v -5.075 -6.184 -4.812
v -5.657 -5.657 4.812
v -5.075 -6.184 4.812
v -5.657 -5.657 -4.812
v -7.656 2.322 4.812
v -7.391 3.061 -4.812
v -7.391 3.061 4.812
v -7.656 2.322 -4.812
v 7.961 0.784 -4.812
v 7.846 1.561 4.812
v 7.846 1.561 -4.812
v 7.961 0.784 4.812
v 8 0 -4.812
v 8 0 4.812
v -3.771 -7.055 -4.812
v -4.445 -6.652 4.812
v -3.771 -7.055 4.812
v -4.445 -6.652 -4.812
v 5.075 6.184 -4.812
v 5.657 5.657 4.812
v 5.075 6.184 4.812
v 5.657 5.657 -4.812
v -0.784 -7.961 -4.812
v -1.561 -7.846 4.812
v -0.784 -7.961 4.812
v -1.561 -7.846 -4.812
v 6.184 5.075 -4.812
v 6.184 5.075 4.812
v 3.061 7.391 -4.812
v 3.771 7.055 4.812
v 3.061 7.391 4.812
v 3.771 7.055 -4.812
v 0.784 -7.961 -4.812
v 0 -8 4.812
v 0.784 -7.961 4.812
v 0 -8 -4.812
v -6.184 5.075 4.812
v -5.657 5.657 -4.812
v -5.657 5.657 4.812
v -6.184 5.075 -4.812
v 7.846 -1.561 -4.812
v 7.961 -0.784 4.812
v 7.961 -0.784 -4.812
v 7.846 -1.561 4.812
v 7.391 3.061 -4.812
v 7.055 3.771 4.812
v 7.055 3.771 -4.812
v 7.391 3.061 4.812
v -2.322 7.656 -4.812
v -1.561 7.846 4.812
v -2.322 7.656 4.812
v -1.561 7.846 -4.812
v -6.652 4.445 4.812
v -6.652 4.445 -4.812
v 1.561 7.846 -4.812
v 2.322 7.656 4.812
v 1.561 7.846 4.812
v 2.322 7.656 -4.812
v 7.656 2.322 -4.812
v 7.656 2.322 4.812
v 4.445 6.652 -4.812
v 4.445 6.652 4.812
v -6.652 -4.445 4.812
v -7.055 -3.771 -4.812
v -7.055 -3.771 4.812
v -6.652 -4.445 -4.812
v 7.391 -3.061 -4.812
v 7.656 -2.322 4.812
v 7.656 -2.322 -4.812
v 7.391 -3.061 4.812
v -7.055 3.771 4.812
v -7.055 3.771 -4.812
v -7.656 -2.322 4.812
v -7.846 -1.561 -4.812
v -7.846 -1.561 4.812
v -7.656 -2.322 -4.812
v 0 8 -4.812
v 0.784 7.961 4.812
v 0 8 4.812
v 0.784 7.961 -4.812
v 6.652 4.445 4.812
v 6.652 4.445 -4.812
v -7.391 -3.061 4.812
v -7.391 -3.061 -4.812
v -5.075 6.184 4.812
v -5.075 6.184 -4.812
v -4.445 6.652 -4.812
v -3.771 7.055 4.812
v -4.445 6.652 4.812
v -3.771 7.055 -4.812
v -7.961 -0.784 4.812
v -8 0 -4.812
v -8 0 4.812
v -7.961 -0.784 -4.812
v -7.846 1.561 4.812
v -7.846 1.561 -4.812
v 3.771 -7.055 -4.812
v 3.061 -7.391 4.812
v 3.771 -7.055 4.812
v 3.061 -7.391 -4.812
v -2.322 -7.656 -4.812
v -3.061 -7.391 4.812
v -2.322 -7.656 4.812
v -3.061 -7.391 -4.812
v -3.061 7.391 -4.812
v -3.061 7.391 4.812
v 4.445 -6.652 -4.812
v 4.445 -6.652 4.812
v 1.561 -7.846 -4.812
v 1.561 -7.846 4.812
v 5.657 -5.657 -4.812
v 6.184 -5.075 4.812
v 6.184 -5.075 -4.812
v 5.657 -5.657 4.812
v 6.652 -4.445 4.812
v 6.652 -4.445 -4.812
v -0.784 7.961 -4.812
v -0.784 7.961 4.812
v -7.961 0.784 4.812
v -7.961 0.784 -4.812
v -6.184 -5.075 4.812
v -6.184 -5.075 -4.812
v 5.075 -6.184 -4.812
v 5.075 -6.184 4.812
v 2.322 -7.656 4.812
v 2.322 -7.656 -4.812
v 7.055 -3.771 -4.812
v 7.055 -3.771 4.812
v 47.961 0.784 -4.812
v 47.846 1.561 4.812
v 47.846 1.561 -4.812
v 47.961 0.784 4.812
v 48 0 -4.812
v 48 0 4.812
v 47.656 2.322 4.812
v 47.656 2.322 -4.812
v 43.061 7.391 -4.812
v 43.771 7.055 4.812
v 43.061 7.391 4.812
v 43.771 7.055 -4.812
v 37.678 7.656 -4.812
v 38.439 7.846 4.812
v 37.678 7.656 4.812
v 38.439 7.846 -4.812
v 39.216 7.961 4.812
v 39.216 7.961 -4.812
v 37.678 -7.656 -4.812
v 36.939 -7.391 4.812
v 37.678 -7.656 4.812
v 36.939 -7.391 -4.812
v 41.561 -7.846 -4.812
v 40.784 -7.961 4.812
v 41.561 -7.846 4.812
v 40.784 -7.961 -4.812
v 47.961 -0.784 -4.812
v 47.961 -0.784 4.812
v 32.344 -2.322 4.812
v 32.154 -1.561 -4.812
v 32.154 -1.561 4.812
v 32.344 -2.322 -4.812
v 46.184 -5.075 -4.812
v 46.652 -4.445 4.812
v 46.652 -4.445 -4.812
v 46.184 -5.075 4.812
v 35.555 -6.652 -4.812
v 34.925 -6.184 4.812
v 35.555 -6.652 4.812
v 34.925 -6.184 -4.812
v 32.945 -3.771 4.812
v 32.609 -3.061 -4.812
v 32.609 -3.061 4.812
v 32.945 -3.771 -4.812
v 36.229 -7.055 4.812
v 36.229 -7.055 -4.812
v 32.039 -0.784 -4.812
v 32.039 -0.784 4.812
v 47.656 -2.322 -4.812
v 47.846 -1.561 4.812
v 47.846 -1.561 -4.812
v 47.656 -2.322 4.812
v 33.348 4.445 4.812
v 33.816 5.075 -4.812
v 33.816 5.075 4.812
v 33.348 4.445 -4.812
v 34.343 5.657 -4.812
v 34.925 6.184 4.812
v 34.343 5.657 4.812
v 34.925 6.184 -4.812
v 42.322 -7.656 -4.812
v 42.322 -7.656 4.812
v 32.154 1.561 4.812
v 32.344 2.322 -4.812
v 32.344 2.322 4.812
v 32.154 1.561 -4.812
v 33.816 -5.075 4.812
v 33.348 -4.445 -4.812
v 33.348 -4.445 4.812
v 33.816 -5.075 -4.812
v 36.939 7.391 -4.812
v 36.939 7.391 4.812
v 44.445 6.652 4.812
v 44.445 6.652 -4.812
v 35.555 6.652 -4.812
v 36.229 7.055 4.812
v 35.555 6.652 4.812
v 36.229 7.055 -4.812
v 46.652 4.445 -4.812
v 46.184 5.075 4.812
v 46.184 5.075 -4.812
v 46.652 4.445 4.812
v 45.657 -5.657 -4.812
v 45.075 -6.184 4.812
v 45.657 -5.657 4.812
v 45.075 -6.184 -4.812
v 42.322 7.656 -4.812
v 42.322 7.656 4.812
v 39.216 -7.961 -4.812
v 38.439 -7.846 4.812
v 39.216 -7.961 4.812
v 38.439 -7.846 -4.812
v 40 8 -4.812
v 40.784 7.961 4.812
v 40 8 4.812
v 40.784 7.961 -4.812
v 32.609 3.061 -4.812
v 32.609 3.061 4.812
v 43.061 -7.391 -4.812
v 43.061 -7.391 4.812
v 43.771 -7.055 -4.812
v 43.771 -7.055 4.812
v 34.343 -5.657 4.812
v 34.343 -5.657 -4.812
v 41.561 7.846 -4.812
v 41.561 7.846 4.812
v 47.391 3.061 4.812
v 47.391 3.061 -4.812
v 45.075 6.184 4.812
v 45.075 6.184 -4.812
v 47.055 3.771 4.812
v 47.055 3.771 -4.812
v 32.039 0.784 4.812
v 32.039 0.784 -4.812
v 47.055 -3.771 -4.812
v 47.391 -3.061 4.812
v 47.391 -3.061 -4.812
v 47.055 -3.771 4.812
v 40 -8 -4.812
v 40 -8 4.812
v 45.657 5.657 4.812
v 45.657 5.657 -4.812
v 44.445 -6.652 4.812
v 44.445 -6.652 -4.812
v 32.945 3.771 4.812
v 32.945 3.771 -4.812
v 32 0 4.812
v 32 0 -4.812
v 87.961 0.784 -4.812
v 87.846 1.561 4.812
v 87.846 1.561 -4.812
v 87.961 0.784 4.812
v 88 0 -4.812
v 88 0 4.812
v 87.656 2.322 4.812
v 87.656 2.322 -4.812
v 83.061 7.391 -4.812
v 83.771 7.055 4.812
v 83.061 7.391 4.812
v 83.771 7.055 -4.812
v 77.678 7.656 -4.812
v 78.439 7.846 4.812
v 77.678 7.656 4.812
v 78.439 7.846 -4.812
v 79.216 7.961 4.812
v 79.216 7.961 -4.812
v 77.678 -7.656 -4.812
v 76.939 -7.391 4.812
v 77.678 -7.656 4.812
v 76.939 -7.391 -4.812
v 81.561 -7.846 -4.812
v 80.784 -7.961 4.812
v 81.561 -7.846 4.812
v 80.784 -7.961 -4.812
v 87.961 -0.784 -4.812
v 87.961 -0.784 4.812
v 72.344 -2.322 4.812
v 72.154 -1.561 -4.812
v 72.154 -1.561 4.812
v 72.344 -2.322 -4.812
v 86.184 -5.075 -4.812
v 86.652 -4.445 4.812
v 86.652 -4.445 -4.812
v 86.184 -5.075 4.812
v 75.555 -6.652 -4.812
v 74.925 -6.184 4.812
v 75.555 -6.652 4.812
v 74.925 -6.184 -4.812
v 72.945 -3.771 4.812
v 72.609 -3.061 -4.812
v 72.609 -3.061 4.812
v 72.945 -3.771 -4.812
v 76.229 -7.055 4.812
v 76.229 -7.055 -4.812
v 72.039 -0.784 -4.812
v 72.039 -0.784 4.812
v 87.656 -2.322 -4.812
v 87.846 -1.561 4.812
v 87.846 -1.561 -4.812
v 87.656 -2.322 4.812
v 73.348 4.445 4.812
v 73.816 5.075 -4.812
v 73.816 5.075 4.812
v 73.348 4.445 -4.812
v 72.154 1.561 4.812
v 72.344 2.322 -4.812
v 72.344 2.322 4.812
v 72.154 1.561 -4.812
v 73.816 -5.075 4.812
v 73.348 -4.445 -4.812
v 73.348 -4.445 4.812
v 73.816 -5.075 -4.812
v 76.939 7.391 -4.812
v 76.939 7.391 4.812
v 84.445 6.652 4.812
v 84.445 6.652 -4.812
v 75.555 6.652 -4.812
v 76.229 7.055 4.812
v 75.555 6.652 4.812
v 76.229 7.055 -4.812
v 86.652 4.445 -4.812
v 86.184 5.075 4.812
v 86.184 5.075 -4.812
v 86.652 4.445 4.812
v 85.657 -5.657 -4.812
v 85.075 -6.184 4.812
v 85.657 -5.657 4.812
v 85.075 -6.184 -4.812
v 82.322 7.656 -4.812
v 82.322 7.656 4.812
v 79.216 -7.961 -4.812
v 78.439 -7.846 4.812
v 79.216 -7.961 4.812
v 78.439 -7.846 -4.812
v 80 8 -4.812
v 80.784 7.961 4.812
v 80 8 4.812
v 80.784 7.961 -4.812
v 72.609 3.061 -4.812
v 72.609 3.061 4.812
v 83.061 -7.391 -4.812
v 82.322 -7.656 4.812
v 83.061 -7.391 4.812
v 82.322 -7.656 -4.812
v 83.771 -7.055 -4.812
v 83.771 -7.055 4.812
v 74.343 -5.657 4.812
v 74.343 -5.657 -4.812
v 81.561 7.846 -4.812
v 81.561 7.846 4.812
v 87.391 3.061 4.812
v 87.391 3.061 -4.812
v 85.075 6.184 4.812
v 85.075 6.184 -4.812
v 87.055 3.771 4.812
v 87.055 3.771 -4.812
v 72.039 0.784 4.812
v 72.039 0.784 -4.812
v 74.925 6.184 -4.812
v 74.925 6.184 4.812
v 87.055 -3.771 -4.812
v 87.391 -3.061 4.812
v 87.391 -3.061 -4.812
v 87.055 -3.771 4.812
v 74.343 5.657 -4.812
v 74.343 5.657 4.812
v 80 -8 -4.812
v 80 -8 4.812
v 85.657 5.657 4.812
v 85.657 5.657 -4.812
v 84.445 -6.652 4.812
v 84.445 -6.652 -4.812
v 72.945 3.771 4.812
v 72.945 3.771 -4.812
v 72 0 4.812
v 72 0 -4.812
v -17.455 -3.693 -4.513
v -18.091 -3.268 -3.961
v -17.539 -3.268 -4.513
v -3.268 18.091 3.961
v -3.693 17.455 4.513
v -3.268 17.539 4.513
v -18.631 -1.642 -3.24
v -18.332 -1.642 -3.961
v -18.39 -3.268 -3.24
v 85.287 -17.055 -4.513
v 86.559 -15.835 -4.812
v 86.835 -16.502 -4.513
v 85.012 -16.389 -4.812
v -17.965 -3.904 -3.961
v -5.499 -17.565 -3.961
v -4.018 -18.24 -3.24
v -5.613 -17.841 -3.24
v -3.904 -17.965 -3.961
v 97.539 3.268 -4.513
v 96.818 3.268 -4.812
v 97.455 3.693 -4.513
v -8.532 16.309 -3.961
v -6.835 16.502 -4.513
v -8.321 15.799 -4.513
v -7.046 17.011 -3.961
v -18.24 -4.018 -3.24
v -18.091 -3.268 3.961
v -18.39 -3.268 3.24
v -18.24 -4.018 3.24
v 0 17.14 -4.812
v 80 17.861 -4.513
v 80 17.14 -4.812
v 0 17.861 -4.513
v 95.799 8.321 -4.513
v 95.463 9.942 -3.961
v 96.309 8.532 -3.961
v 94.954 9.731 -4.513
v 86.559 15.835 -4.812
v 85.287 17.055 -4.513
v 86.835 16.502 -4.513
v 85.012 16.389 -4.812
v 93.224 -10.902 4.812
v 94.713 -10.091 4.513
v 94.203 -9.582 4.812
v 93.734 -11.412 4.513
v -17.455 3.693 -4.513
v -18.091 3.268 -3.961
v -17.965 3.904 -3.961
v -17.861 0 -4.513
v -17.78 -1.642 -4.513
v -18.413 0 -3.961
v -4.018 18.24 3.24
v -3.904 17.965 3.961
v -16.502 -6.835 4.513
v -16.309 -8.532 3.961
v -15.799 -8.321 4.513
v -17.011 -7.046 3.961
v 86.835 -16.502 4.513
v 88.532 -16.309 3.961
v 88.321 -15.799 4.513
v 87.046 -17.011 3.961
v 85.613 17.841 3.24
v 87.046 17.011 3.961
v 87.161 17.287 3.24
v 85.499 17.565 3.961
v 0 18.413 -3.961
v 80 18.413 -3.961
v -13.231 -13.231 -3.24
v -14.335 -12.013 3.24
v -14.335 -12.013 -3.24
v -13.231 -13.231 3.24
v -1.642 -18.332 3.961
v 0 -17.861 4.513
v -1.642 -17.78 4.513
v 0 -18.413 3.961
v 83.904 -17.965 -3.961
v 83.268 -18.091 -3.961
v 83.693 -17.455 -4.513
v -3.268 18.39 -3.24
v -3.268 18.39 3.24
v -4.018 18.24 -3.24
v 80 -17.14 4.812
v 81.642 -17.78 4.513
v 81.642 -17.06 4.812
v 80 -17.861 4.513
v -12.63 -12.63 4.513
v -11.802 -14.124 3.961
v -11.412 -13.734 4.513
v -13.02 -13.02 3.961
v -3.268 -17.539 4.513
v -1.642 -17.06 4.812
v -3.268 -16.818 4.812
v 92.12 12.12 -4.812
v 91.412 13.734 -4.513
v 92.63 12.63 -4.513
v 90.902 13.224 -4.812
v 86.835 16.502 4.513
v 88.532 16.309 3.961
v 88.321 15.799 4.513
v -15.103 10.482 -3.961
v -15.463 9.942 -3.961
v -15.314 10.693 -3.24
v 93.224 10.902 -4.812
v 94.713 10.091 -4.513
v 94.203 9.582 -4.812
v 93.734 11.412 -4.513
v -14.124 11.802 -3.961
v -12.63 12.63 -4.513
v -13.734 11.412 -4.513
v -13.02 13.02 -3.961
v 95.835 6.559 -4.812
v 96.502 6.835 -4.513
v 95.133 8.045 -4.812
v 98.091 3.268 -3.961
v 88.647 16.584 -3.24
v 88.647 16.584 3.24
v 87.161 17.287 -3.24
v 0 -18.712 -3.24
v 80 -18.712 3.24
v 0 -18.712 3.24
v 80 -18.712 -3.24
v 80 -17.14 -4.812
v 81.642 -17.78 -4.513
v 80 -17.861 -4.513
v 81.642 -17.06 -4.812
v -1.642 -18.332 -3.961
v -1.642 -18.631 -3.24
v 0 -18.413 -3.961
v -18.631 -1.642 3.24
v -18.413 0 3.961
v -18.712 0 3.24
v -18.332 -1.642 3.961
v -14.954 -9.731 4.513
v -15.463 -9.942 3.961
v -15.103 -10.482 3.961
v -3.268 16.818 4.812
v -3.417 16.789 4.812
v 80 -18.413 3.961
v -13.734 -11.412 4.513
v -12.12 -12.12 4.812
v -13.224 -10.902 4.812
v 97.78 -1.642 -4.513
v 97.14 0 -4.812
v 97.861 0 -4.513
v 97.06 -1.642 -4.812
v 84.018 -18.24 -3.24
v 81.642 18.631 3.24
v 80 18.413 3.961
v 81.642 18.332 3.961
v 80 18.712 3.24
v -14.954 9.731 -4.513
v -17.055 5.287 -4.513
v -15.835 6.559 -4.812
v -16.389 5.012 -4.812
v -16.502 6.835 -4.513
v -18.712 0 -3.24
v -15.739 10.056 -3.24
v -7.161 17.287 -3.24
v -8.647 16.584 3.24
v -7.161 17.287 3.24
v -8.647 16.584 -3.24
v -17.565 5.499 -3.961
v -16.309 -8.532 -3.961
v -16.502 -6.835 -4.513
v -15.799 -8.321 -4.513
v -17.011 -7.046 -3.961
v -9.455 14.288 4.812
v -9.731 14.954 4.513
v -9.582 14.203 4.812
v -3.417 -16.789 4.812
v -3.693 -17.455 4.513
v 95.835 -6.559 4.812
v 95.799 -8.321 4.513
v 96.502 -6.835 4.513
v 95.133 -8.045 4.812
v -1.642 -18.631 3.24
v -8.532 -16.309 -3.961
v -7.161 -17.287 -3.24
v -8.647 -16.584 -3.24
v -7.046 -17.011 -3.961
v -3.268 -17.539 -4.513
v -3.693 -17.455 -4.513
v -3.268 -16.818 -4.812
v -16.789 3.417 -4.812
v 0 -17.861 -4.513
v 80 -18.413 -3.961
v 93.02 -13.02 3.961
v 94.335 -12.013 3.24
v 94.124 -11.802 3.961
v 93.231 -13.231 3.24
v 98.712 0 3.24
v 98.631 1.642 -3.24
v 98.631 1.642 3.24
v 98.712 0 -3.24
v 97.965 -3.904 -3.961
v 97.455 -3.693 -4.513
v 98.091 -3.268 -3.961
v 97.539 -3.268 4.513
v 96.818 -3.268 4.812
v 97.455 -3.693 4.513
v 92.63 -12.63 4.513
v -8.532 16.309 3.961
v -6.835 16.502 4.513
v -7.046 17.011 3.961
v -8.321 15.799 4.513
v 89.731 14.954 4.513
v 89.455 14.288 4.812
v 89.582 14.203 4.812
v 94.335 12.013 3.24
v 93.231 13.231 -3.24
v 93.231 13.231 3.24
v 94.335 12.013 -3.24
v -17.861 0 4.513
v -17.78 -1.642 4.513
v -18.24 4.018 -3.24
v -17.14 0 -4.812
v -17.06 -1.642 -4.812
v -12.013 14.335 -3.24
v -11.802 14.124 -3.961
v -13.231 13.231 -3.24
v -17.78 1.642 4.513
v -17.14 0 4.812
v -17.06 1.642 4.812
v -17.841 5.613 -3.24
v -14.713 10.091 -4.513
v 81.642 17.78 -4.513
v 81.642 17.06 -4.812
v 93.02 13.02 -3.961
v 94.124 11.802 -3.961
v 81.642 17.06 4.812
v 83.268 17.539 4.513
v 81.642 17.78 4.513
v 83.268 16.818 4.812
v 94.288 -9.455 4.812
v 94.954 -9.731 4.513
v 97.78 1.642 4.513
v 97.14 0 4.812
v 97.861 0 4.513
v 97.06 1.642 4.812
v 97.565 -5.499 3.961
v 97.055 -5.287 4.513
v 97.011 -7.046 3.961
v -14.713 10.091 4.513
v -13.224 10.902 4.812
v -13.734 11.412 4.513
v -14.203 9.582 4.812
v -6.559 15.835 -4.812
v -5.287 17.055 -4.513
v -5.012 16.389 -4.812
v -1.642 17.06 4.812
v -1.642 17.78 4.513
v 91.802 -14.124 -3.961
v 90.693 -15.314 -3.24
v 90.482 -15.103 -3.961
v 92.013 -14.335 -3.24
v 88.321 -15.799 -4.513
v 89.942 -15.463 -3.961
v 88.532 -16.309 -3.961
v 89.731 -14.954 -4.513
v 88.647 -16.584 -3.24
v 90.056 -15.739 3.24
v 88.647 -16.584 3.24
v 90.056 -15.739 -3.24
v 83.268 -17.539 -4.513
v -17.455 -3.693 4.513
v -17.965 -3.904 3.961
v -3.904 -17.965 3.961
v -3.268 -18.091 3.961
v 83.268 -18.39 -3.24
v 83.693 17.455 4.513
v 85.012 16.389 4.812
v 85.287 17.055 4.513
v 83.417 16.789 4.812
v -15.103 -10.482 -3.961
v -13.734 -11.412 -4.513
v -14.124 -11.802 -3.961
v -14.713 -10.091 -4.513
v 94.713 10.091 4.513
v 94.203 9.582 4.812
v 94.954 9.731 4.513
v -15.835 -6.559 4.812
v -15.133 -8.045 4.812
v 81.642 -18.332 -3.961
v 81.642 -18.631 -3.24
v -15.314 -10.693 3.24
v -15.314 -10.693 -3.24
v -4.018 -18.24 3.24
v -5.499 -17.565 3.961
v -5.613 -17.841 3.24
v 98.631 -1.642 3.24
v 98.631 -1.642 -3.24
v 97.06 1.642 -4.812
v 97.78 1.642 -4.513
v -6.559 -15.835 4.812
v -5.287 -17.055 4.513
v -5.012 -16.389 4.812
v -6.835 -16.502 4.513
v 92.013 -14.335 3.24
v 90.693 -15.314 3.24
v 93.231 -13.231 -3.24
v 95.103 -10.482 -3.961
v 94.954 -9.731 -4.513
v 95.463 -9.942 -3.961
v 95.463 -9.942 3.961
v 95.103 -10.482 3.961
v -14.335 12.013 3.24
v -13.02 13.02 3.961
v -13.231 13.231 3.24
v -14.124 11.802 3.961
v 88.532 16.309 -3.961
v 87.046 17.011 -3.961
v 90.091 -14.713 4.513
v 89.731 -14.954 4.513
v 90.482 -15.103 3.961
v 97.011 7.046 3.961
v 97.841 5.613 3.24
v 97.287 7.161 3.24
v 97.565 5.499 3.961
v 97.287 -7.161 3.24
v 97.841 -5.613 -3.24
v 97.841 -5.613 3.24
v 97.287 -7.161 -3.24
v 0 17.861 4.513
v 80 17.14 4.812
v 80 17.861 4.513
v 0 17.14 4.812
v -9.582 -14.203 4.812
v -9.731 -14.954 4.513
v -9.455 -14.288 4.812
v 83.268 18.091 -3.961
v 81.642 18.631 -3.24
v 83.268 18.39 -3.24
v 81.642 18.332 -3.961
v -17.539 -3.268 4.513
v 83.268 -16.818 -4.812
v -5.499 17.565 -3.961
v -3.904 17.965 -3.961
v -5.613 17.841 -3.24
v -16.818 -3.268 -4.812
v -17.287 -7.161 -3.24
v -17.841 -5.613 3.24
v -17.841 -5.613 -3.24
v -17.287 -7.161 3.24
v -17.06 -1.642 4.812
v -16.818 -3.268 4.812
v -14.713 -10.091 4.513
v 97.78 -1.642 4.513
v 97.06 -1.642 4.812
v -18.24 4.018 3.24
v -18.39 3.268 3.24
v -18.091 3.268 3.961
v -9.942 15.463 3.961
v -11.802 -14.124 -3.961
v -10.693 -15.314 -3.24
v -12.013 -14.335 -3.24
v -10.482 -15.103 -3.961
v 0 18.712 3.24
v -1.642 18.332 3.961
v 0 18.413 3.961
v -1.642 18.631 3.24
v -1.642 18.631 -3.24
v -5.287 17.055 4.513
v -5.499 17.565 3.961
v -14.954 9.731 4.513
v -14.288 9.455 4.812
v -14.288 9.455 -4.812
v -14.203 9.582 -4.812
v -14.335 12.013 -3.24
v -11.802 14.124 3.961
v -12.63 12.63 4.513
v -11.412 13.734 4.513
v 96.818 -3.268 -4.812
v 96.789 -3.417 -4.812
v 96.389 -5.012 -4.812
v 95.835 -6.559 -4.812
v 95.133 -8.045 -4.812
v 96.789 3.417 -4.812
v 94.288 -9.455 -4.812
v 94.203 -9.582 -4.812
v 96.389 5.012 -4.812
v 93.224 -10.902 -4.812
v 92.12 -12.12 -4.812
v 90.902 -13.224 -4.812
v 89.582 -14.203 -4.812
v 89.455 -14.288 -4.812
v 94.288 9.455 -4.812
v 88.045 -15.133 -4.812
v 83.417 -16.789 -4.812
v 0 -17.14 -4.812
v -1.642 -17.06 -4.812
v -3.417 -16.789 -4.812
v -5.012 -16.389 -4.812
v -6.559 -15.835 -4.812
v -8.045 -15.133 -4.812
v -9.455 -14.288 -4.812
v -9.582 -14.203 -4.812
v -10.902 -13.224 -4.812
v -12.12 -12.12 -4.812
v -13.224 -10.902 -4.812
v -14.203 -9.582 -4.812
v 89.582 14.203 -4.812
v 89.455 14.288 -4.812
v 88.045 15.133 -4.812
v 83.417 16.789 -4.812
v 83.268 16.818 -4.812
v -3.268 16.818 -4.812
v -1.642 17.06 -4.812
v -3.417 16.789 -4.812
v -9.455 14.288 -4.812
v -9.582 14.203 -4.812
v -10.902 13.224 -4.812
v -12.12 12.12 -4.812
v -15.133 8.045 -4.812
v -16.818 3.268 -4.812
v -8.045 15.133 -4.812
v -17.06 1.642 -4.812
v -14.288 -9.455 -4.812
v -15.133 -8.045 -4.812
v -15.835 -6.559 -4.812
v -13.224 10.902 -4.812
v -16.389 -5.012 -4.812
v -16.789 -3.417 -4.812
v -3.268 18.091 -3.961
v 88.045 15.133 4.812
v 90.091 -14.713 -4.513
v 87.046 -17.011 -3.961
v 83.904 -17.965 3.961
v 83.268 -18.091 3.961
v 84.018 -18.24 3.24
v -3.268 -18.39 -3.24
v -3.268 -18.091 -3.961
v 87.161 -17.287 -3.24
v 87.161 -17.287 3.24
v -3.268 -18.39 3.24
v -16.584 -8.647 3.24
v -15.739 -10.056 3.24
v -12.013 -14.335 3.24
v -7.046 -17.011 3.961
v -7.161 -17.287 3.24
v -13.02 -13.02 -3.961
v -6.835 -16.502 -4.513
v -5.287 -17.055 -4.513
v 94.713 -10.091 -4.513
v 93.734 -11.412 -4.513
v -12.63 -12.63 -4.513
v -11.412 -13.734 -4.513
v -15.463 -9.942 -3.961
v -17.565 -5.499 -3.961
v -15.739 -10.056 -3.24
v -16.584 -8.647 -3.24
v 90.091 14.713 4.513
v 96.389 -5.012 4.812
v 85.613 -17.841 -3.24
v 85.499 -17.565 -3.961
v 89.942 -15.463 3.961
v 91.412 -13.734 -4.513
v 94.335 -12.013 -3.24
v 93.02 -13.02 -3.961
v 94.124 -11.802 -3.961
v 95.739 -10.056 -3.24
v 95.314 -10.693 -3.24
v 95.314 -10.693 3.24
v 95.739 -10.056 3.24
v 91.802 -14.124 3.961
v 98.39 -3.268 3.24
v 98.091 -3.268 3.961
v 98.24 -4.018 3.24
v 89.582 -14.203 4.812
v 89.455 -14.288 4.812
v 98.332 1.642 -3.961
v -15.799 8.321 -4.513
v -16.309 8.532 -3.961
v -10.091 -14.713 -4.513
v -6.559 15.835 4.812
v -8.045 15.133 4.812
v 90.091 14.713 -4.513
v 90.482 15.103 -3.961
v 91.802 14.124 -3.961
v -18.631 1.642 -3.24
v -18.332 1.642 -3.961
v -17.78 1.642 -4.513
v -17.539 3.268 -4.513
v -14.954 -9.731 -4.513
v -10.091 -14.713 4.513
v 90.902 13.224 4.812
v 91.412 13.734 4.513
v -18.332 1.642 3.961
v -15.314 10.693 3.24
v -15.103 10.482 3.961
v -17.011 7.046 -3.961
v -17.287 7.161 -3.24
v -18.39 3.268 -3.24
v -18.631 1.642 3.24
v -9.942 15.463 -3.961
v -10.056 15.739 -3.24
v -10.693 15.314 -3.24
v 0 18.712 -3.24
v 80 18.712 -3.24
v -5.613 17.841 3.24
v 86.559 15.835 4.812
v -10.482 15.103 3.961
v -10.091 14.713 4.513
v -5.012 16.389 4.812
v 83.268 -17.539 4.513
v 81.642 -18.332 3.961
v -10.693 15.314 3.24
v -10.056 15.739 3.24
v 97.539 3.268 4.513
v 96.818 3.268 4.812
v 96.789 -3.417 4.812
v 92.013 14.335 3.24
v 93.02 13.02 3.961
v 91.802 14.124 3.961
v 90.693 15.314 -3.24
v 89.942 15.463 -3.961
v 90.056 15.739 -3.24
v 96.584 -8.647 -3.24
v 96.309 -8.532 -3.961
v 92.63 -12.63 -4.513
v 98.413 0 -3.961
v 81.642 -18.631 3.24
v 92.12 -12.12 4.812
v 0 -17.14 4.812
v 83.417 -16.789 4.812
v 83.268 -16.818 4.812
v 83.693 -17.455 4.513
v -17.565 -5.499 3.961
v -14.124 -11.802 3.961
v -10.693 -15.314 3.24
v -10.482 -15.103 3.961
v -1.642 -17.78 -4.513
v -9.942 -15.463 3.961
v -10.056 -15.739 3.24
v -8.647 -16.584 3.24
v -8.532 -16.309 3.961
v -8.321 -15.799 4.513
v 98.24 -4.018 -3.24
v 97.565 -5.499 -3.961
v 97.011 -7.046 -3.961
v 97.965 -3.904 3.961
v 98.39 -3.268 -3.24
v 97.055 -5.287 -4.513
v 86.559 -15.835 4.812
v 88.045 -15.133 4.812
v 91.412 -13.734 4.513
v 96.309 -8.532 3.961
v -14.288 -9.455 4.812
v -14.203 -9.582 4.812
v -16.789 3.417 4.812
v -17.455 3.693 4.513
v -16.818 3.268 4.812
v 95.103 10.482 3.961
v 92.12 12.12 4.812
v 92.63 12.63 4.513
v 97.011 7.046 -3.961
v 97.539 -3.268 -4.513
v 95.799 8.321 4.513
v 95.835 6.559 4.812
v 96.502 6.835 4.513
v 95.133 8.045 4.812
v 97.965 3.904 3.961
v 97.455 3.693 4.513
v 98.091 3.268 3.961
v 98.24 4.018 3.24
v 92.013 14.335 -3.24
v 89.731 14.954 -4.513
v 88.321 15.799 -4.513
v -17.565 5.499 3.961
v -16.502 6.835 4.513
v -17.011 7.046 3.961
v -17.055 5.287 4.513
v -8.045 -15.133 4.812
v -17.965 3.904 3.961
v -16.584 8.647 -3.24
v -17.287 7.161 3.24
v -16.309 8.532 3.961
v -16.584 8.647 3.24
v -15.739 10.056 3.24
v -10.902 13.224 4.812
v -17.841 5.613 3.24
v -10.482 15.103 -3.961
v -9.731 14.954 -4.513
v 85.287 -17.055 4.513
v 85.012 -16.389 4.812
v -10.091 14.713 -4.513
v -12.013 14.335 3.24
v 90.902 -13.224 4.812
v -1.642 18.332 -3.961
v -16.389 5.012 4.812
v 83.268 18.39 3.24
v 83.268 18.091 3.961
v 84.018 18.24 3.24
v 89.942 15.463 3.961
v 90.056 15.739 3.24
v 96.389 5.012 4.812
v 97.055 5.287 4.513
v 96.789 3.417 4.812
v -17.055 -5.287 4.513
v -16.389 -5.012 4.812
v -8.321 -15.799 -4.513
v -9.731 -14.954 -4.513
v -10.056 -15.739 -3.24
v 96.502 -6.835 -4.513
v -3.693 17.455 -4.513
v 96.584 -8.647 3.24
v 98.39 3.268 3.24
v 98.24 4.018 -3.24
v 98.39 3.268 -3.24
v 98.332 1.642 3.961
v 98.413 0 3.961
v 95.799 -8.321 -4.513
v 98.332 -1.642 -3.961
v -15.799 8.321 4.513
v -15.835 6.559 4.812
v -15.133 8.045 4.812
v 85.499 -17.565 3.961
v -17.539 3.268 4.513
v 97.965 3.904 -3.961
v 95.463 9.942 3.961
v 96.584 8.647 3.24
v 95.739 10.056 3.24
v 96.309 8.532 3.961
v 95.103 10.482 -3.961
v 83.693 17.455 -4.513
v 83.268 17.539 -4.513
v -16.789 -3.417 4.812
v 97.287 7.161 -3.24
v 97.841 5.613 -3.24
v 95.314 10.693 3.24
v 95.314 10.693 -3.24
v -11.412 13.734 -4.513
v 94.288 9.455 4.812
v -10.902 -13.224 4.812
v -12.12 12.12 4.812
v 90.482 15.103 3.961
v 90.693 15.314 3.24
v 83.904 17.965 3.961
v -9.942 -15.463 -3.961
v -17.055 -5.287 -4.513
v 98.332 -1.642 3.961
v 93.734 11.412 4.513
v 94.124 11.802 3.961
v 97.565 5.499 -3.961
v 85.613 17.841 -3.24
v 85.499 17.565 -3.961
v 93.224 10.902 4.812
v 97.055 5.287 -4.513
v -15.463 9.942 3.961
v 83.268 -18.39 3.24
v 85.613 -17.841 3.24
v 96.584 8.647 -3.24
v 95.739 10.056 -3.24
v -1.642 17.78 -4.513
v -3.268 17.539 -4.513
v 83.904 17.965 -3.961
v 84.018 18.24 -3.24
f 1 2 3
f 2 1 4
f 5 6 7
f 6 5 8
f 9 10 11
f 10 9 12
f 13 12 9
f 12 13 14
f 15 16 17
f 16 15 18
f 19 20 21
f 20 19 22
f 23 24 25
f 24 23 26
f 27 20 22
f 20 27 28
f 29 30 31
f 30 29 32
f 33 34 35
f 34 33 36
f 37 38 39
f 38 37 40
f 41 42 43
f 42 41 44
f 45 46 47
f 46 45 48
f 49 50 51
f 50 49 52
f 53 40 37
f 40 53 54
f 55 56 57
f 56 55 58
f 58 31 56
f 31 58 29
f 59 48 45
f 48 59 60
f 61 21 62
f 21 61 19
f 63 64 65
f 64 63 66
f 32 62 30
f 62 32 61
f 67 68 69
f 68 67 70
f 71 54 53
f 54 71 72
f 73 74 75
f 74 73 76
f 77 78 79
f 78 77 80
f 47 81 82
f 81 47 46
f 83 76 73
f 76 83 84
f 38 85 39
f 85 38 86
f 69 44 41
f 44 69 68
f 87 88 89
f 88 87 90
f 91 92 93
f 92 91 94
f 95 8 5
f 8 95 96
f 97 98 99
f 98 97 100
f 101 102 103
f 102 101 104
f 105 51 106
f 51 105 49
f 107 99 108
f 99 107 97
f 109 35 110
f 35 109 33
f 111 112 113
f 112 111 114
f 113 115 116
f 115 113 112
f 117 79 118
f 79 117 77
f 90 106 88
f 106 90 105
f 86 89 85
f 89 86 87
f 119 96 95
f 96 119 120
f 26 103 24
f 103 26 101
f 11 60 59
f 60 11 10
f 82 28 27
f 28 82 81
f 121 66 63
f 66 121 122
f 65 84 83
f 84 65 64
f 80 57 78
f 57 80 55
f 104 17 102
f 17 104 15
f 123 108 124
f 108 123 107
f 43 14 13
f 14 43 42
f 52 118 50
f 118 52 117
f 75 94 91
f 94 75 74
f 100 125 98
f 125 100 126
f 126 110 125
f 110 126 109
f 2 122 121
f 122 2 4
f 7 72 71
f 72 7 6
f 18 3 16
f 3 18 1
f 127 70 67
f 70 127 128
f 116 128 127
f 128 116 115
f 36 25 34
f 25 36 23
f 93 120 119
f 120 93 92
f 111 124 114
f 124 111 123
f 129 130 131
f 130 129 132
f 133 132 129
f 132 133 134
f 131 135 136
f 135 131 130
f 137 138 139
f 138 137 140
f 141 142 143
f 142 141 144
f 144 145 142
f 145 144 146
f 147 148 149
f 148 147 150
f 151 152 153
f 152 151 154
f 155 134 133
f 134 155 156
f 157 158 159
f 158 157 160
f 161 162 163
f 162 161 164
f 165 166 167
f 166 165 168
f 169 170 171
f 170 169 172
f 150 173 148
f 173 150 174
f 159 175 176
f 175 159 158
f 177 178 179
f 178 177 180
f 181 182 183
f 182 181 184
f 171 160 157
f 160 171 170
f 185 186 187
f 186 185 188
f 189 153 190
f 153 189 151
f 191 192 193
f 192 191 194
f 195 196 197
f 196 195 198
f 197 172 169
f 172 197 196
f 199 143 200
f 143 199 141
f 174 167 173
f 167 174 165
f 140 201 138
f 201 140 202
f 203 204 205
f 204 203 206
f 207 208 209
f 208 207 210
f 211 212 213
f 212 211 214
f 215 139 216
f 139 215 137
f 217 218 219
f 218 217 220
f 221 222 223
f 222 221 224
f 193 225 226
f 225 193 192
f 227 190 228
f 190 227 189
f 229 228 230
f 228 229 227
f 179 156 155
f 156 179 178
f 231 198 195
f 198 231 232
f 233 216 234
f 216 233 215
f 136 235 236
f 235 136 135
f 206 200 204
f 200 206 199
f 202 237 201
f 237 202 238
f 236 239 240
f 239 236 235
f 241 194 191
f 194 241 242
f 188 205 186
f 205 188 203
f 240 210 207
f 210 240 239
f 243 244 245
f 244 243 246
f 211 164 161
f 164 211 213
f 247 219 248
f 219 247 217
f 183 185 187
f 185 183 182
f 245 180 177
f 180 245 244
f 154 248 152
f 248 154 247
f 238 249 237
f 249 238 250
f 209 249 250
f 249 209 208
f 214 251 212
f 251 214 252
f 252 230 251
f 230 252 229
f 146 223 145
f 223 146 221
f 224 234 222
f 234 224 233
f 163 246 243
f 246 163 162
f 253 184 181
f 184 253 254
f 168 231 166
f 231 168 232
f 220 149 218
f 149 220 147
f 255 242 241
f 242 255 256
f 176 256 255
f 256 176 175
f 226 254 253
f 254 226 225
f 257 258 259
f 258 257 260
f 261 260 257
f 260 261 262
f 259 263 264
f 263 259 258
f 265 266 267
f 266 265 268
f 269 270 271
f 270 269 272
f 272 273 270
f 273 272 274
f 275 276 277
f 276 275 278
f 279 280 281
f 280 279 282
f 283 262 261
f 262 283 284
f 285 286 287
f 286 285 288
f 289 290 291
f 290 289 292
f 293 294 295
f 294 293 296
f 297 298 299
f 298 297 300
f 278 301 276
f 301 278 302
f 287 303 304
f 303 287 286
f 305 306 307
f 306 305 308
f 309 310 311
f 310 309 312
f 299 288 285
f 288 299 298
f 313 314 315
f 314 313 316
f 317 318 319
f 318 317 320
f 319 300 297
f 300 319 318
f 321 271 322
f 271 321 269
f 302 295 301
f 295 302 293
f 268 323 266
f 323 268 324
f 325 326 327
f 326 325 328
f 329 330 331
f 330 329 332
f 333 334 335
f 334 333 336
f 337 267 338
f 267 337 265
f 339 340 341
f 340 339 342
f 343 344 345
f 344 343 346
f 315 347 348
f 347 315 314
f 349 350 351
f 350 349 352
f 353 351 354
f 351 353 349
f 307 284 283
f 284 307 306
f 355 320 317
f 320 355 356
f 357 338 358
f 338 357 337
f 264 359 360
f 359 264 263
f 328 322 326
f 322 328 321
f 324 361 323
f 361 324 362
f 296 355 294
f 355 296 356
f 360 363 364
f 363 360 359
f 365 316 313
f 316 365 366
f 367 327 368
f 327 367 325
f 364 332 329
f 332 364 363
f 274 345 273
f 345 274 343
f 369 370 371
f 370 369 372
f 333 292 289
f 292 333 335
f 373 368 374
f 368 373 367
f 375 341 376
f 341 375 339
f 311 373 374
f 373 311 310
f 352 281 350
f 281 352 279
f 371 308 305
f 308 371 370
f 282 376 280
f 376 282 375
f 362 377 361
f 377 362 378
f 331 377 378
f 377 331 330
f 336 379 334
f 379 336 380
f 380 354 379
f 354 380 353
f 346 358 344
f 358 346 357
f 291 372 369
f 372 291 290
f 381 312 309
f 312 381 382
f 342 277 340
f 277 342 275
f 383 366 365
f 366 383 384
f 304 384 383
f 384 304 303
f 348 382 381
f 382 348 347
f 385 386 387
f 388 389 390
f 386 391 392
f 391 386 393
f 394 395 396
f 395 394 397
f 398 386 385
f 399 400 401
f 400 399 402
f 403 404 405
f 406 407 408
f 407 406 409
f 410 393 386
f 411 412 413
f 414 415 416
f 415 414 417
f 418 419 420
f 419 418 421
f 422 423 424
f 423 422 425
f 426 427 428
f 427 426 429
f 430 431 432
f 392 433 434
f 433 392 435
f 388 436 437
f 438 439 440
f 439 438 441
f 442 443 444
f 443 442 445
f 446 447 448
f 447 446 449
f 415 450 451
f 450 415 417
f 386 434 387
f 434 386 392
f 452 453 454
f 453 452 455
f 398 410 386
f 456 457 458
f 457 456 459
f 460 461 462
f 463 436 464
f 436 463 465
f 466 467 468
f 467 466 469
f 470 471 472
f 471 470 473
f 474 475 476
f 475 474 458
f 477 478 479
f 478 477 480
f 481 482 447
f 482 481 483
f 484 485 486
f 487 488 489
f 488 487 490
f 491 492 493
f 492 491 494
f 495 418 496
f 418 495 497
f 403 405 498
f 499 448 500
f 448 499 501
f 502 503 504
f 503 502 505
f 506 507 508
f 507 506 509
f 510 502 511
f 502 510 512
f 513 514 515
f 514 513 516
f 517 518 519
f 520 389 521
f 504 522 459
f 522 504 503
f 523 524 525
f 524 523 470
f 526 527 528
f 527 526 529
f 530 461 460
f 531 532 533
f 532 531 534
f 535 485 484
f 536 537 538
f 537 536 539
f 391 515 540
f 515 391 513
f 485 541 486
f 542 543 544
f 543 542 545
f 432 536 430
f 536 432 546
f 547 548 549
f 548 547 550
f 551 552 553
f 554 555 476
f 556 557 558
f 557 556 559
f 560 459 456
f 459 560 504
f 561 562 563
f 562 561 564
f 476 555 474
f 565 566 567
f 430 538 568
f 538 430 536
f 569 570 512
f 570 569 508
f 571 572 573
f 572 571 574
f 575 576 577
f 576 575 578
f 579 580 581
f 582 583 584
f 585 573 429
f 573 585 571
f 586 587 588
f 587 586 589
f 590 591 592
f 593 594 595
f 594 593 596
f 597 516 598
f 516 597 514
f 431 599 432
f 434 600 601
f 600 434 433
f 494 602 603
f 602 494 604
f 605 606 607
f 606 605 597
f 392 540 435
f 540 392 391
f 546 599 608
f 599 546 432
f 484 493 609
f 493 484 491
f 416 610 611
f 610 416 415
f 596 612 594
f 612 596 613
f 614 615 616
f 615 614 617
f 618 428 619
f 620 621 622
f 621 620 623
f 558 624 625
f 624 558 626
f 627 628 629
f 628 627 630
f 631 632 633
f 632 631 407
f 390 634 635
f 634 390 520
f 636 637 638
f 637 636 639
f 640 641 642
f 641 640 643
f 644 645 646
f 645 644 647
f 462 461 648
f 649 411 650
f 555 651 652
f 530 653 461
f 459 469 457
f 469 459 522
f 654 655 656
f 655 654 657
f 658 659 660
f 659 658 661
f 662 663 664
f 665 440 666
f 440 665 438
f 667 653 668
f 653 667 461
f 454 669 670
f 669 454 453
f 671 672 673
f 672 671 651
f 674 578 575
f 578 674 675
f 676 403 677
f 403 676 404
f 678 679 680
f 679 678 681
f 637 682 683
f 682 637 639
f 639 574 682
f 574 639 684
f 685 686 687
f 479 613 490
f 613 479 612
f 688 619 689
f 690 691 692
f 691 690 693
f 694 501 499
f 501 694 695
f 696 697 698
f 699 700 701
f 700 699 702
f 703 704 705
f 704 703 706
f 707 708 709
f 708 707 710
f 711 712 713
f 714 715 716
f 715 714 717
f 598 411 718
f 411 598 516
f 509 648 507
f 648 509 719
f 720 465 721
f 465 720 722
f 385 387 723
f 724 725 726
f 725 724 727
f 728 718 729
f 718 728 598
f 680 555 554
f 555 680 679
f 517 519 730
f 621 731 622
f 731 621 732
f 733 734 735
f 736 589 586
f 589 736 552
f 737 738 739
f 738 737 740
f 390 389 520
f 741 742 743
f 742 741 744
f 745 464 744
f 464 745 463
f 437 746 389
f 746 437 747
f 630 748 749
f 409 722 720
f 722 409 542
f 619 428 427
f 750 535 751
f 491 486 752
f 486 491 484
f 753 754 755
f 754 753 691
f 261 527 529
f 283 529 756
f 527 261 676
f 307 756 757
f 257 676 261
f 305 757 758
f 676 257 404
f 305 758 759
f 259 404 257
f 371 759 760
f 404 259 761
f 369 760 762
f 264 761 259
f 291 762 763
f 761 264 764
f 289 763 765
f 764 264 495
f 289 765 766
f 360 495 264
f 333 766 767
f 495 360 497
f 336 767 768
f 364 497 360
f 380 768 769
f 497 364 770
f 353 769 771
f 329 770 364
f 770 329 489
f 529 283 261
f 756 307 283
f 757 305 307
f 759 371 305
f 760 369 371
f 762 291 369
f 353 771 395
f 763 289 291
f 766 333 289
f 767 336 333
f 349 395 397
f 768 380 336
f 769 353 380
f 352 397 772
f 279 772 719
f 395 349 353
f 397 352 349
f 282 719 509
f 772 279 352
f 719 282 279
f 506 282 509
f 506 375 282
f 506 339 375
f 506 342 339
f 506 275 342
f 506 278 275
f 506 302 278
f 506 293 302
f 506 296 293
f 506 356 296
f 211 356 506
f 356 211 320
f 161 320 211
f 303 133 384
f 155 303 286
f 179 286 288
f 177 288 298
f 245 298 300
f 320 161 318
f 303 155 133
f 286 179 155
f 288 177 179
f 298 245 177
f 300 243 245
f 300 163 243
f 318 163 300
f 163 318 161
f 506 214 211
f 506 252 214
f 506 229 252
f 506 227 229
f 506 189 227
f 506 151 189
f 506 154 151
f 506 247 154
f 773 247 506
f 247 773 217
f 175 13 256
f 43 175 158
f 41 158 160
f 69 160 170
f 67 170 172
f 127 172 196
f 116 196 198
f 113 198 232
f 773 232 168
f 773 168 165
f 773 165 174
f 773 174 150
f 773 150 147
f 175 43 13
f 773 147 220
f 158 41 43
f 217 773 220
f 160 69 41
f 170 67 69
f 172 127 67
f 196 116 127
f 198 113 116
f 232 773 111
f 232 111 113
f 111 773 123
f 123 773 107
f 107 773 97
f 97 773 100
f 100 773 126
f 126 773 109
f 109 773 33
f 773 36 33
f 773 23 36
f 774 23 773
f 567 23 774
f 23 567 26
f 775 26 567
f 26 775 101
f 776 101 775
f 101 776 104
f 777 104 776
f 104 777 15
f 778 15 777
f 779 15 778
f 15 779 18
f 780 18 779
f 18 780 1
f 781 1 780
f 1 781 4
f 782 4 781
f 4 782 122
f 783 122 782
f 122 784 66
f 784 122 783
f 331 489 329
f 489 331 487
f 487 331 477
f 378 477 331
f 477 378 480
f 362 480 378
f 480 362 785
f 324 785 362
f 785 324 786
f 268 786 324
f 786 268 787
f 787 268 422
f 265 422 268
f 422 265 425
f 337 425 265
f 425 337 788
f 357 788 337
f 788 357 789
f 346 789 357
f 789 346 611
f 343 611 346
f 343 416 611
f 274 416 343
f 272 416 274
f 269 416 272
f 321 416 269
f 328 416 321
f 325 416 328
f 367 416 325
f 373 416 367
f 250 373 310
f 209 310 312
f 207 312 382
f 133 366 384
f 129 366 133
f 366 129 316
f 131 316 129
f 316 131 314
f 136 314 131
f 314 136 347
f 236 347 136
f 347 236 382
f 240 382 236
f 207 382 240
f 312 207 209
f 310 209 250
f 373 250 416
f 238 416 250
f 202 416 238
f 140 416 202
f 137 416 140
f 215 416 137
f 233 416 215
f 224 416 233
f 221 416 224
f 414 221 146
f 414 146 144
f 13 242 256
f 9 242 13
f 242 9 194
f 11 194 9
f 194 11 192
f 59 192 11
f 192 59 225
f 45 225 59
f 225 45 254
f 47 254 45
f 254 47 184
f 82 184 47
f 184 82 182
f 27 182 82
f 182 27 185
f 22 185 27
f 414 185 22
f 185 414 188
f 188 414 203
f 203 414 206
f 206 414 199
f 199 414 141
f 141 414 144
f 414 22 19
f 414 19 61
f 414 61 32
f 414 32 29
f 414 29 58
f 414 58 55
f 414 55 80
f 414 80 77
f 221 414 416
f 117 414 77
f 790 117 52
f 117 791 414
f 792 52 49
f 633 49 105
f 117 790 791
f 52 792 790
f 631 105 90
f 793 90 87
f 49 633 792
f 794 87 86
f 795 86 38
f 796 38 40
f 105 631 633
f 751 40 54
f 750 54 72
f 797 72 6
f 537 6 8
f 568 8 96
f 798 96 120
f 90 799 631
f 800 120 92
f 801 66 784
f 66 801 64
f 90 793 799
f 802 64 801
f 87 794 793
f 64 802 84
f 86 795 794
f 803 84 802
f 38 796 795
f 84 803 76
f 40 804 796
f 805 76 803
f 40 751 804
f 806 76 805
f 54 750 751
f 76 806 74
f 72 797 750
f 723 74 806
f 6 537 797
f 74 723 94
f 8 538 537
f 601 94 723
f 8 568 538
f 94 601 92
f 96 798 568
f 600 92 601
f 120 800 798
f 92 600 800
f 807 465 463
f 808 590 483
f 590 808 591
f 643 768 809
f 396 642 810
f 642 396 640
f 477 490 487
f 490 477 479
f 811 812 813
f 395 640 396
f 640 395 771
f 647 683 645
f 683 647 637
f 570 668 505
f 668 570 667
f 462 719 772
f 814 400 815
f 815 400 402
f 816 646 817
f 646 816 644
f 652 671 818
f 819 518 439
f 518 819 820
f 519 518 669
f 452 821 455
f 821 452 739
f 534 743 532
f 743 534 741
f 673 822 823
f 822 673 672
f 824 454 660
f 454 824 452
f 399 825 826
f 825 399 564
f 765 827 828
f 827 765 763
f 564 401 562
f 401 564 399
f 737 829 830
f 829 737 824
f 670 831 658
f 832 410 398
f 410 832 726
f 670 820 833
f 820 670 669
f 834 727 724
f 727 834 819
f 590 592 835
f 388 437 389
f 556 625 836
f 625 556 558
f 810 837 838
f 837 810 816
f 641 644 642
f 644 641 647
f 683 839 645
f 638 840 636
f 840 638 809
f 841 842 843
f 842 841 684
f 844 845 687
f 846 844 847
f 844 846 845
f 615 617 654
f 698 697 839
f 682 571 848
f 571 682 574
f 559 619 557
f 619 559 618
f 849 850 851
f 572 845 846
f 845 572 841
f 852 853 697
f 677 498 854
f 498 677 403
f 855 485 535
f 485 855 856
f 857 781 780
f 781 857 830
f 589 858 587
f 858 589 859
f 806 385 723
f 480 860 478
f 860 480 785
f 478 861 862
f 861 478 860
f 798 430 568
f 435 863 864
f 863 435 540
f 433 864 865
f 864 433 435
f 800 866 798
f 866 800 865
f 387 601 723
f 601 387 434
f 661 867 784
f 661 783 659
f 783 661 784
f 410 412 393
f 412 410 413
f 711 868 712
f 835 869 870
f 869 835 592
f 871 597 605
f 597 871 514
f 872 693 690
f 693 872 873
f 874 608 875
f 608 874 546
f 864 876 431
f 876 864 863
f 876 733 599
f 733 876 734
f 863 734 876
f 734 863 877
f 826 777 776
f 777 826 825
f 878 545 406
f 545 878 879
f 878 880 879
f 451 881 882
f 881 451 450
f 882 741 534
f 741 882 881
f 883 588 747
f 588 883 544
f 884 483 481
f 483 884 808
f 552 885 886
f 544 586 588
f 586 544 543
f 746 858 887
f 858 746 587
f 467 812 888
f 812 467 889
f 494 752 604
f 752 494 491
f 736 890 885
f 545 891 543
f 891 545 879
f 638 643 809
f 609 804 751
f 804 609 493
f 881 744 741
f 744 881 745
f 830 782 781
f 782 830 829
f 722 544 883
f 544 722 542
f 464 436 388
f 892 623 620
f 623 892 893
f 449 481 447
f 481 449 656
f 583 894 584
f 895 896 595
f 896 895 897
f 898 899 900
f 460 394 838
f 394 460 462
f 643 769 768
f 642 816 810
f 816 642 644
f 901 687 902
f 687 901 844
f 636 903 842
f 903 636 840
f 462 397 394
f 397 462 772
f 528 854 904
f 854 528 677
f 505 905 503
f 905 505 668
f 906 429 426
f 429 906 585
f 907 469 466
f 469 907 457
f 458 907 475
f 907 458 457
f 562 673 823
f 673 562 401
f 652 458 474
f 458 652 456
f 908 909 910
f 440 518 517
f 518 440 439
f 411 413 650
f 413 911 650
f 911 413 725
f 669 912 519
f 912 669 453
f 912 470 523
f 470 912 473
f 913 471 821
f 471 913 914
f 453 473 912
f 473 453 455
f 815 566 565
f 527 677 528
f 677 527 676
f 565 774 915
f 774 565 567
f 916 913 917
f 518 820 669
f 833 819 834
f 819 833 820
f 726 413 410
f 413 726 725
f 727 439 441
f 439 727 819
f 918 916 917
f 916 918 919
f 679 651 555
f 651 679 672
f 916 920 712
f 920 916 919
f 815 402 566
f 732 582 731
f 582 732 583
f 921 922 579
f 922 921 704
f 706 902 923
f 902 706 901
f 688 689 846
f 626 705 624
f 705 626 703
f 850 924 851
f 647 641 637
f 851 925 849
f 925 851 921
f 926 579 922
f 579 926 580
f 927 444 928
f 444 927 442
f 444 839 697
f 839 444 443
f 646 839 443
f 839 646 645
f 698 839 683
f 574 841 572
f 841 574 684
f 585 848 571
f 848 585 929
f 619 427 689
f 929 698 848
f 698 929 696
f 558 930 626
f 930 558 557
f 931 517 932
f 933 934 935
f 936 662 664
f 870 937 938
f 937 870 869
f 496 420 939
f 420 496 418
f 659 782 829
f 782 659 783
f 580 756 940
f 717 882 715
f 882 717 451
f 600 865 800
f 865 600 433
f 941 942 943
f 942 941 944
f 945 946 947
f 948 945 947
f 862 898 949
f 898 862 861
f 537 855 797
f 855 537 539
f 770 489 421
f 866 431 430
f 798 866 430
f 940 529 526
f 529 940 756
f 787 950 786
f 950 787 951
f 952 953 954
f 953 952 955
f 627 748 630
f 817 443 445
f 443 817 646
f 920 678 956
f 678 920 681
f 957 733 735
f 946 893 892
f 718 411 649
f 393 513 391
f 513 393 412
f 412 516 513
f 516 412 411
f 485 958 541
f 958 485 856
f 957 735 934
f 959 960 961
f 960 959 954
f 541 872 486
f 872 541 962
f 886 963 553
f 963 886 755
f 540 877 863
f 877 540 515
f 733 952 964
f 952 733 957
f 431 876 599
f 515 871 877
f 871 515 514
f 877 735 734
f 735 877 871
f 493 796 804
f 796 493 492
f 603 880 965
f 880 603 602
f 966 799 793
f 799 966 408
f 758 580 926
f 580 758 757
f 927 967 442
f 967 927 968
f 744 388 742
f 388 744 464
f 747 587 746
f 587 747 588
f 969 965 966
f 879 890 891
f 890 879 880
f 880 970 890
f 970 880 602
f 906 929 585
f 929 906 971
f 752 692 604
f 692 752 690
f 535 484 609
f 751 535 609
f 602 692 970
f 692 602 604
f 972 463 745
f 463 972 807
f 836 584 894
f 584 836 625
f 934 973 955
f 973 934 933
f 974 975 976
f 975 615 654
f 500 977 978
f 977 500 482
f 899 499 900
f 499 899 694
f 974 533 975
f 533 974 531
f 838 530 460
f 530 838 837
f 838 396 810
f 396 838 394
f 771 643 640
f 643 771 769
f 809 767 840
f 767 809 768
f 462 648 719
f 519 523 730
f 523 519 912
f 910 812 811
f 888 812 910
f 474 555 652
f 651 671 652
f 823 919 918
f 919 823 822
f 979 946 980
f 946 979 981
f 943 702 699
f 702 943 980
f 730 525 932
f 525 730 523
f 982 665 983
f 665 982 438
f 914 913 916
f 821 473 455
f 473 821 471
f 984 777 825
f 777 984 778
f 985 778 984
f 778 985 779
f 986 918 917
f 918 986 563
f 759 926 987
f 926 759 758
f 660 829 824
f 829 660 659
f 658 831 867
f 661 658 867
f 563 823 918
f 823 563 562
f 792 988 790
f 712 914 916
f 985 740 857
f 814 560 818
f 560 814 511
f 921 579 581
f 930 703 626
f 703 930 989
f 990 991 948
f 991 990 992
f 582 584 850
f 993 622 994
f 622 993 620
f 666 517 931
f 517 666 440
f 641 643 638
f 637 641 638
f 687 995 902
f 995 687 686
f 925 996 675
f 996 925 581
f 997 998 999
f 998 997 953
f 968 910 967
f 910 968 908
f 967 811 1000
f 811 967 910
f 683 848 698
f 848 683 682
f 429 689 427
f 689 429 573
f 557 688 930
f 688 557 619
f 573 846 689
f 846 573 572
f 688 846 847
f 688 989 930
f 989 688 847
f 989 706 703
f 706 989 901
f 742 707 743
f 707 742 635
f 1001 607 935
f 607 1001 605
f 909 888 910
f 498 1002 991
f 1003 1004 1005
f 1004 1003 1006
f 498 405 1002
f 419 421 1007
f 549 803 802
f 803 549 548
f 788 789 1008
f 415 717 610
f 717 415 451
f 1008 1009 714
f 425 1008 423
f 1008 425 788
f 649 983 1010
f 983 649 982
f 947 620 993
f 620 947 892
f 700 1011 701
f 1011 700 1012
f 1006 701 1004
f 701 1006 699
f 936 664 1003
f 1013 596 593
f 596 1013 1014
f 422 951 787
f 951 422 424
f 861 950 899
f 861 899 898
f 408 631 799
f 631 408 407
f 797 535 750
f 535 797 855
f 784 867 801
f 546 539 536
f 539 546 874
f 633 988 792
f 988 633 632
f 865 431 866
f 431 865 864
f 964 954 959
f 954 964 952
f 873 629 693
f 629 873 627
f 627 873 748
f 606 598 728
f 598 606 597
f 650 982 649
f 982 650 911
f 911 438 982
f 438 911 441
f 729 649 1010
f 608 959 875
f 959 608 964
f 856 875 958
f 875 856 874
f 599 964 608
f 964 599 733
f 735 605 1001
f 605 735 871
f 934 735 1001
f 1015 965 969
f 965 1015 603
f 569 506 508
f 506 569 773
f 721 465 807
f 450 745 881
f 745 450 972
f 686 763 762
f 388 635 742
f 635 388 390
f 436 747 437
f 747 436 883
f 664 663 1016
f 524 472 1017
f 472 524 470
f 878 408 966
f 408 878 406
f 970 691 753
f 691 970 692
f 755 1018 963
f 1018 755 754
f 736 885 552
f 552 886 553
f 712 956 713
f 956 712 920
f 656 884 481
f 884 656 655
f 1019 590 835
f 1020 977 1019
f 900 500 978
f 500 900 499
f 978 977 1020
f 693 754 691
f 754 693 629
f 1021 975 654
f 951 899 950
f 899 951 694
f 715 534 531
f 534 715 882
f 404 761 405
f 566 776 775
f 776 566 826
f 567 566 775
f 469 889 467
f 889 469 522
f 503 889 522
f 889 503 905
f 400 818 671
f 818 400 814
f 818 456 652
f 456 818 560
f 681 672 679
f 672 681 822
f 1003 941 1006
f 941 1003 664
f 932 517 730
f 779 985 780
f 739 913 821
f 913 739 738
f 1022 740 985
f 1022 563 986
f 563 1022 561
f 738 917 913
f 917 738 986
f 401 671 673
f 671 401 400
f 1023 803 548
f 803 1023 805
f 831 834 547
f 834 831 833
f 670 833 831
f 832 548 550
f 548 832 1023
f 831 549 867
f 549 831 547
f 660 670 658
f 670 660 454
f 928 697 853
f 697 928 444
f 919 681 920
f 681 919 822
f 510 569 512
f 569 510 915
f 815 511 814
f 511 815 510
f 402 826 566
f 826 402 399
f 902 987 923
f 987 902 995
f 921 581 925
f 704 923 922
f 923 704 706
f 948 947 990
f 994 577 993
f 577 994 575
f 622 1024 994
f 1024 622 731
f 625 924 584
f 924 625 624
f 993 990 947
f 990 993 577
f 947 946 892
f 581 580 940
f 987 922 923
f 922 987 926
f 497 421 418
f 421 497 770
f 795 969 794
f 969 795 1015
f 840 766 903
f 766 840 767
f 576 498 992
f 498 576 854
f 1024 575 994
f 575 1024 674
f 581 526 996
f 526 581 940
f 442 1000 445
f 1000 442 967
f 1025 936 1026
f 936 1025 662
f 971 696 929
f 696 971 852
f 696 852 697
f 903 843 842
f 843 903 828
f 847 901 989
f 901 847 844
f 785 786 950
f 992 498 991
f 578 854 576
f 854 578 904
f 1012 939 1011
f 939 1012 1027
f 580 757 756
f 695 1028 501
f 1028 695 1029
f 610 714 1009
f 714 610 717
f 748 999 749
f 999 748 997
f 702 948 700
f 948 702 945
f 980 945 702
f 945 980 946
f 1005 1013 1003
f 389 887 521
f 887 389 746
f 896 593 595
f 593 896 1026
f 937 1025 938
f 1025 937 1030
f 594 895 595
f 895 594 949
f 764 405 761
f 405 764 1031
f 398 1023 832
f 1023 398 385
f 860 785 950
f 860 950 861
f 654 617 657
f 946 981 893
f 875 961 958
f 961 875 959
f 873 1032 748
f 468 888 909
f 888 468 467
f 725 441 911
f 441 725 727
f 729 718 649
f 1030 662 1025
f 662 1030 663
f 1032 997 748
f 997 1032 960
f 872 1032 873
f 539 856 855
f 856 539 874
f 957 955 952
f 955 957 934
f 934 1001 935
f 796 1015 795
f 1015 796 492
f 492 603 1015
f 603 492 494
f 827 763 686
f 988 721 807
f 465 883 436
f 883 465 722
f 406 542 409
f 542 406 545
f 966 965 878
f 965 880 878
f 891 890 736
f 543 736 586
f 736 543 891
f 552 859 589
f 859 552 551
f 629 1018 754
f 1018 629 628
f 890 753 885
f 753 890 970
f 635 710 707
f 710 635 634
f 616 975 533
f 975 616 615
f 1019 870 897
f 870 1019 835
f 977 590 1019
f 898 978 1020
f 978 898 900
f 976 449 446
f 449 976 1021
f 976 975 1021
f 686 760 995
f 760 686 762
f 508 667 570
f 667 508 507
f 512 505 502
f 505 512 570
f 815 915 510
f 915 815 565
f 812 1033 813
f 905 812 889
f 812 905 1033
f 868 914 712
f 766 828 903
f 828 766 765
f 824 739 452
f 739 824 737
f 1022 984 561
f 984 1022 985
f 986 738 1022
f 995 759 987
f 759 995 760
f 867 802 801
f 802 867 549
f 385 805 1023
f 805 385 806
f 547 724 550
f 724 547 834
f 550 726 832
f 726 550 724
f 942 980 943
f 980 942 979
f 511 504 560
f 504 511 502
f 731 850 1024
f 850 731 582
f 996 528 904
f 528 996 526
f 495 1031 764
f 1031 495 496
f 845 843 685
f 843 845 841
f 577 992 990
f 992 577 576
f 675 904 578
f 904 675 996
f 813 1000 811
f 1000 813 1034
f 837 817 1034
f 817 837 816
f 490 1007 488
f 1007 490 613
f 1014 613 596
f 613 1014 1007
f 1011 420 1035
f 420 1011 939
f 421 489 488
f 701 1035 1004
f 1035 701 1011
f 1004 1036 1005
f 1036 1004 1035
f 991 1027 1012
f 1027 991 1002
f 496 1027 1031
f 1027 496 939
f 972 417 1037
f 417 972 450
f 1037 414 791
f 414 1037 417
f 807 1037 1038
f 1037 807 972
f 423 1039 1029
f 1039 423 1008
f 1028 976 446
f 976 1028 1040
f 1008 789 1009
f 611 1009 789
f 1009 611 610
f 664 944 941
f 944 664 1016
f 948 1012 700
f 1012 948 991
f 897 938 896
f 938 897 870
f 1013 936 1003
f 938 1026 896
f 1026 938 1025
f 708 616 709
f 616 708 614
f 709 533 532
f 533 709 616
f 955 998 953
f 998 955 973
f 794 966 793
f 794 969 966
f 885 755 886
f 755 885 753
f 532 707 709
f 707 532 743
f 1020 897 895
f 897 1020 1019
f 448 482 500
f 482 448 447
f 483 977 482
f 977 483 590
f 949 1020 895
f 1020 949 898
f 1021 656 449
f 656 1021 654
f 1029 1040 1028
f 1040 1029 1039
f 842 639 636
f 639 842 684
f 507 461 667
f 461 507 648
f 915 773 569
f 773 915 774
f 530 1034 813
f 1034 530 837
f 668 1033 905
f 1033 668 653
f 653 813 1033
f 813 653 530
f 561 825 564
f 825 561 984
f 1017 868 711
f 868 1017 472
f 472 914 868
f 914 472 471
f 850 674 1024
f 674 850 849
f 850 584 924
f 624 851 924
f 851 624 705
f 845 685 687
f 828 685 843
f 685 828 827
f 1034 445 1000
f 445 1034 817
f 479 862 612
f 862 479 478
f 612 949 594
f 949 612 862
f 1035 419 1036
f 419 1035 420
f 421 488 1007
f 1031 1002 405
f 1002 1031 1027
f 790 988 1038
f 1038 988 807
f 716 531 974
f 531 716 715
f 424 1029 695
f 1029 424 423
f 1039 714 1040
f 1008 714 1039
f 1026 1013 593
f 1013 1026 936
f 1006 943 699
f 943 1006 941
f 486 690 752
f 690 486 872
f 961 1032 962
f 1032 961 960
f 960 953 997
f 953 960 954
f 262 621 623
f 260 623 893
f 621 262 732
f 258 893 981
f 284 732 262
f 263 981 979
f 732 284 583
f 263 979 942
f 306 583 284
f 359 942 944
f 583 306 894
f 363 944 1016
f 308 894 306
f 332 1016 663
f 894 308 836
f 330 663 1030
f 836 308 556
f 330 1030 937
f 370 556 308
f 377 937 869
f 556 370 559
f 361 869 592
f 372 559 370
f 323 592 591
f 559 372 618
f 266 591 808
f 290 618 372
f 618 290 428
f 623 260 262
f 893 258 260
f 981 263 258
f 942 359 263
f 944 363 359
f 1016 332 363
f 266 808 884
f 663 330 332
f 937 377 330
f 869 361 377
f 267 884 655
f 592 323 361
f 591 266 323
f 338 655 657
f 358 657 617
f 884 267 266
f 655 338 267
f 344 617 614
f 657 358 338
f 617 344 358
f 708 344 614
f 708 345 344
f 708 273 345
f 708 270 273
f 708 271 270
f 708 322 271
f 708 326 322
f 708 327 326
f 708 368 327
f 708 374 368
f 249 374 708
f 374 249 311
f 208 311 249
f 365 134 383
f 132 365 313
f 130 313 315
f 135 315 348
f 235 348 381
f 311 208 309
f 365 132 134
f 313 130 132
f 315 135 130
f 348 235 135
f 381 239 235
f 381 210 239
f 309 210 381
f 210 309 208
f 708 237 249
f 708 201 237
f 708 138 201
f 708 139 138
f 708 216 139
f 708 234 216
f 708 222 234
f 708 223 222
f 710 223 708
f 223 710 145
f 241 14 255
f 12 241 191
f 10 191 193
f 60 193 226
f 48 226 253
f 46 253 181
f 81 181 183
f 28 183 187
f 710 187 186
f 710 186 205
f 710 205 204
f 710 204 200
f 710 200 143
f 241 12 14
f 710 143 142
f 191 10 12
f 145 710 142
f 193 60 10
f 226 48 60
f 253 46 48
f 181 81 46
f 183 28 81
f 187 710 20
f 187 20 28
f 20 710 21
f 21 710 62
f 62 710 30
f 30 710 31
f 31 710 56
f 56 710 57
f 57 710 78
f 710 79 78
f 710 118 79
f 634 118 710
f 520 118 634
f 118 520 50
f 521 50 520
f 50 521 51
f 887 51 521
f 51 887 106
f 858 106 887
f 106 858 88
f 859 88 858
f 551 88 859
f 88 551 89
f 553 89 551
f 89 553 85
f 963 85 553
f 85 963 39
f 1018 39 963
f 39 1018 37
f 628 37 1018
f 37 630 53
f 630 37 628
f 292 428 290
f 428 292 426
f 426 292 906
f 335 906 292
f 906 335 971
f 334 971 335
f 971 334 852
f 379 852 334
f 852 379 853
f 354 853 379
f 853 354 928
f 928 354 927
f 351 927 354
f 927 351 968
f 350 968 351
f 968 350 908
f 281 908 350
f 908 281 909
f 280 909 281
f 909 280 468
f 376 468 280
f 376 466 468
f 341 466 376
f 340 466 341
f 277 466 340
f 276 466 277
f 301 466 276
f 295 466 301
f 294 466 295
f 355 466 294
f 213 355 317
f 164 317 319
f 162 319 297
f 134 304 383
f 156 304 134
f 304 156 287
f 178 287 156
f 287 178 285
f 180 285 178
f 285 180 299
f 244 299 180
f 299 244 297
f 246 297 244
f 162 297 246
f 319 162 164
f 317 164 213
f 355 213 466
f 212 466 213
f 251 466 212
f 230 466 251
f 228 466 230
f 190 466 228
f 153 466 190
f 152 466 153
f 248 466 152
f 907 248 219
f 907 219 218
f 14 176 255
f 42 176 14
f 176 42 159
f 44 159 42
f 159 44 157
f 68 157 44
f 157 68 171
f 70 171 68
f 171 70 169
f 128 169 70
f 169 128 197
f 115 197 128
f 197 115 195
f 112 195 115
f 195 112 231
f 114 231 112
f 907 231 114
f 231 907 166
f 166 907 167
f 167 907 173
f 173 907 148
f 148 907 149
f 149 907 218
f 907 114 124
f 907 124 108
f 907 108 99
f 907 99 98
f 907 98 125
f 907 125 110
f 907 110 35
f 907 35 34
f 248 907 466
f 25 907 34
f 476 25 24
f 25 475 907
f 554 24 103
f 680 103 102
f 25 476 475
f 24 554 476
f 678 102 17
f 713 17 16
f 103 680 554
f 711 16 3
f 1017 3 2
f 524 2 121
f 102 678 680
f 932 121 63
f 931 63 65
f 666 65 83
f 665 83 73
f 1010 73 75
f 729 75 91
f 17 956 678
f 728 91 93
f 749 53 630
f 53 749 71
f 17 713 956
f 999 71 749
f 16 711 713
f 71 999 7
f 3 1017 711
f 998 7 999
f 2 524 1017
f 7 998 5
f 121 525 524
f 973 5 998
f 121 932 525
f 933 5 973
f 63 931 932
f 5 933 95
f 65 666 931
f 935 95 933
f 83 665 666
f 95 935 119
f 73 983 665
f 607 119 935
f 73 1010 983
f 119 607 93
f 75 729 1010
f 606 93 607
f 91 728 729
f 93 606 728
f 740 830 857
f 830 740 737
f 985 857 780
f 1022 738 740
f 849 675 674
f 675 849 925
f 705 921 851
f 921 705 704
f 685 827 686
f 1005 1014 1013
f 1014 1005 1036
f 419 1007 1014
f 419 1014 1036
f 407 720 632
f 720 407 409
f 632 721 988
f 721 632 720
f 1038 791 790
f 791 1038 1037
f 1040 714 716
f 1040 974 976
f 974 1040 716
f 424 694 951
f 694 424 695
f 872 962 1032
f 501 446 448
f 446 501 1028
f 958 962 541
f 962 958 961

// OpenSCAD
// Number of holes
holes=3; // [2, 3, 4, 5, 6]

/* [Hidden] */

// Bar thickness
thickness=9.7;

// Bar width.
width=37.5;

// Rounded edges.
edge_round=4;

// Hole diameter.
hole_diameter=16;

// Distance between the holes.
hole_distance=40;

$fn=64;

difference() {
	// Create the bar.
	minkowski() {
		linear_extrude(height=thickness-edge_round,center=true)
			hull() {
				circle(d=width-edge_round);
				translate([(holes-1)*hole_distance,0,0])
					circle(d=width-edge_round);
			}
		// Minkowski with sphere gives the nicely rounded edges.
		sphere(d=edge_round,$fn=16);
	}

	// Cut holes.
	for (i=[0:holes-1]) {
		translate([i*hole_distance,0,0])
			cylinder(d=hole_diameter,h=thickness,center=true);
	}
}
